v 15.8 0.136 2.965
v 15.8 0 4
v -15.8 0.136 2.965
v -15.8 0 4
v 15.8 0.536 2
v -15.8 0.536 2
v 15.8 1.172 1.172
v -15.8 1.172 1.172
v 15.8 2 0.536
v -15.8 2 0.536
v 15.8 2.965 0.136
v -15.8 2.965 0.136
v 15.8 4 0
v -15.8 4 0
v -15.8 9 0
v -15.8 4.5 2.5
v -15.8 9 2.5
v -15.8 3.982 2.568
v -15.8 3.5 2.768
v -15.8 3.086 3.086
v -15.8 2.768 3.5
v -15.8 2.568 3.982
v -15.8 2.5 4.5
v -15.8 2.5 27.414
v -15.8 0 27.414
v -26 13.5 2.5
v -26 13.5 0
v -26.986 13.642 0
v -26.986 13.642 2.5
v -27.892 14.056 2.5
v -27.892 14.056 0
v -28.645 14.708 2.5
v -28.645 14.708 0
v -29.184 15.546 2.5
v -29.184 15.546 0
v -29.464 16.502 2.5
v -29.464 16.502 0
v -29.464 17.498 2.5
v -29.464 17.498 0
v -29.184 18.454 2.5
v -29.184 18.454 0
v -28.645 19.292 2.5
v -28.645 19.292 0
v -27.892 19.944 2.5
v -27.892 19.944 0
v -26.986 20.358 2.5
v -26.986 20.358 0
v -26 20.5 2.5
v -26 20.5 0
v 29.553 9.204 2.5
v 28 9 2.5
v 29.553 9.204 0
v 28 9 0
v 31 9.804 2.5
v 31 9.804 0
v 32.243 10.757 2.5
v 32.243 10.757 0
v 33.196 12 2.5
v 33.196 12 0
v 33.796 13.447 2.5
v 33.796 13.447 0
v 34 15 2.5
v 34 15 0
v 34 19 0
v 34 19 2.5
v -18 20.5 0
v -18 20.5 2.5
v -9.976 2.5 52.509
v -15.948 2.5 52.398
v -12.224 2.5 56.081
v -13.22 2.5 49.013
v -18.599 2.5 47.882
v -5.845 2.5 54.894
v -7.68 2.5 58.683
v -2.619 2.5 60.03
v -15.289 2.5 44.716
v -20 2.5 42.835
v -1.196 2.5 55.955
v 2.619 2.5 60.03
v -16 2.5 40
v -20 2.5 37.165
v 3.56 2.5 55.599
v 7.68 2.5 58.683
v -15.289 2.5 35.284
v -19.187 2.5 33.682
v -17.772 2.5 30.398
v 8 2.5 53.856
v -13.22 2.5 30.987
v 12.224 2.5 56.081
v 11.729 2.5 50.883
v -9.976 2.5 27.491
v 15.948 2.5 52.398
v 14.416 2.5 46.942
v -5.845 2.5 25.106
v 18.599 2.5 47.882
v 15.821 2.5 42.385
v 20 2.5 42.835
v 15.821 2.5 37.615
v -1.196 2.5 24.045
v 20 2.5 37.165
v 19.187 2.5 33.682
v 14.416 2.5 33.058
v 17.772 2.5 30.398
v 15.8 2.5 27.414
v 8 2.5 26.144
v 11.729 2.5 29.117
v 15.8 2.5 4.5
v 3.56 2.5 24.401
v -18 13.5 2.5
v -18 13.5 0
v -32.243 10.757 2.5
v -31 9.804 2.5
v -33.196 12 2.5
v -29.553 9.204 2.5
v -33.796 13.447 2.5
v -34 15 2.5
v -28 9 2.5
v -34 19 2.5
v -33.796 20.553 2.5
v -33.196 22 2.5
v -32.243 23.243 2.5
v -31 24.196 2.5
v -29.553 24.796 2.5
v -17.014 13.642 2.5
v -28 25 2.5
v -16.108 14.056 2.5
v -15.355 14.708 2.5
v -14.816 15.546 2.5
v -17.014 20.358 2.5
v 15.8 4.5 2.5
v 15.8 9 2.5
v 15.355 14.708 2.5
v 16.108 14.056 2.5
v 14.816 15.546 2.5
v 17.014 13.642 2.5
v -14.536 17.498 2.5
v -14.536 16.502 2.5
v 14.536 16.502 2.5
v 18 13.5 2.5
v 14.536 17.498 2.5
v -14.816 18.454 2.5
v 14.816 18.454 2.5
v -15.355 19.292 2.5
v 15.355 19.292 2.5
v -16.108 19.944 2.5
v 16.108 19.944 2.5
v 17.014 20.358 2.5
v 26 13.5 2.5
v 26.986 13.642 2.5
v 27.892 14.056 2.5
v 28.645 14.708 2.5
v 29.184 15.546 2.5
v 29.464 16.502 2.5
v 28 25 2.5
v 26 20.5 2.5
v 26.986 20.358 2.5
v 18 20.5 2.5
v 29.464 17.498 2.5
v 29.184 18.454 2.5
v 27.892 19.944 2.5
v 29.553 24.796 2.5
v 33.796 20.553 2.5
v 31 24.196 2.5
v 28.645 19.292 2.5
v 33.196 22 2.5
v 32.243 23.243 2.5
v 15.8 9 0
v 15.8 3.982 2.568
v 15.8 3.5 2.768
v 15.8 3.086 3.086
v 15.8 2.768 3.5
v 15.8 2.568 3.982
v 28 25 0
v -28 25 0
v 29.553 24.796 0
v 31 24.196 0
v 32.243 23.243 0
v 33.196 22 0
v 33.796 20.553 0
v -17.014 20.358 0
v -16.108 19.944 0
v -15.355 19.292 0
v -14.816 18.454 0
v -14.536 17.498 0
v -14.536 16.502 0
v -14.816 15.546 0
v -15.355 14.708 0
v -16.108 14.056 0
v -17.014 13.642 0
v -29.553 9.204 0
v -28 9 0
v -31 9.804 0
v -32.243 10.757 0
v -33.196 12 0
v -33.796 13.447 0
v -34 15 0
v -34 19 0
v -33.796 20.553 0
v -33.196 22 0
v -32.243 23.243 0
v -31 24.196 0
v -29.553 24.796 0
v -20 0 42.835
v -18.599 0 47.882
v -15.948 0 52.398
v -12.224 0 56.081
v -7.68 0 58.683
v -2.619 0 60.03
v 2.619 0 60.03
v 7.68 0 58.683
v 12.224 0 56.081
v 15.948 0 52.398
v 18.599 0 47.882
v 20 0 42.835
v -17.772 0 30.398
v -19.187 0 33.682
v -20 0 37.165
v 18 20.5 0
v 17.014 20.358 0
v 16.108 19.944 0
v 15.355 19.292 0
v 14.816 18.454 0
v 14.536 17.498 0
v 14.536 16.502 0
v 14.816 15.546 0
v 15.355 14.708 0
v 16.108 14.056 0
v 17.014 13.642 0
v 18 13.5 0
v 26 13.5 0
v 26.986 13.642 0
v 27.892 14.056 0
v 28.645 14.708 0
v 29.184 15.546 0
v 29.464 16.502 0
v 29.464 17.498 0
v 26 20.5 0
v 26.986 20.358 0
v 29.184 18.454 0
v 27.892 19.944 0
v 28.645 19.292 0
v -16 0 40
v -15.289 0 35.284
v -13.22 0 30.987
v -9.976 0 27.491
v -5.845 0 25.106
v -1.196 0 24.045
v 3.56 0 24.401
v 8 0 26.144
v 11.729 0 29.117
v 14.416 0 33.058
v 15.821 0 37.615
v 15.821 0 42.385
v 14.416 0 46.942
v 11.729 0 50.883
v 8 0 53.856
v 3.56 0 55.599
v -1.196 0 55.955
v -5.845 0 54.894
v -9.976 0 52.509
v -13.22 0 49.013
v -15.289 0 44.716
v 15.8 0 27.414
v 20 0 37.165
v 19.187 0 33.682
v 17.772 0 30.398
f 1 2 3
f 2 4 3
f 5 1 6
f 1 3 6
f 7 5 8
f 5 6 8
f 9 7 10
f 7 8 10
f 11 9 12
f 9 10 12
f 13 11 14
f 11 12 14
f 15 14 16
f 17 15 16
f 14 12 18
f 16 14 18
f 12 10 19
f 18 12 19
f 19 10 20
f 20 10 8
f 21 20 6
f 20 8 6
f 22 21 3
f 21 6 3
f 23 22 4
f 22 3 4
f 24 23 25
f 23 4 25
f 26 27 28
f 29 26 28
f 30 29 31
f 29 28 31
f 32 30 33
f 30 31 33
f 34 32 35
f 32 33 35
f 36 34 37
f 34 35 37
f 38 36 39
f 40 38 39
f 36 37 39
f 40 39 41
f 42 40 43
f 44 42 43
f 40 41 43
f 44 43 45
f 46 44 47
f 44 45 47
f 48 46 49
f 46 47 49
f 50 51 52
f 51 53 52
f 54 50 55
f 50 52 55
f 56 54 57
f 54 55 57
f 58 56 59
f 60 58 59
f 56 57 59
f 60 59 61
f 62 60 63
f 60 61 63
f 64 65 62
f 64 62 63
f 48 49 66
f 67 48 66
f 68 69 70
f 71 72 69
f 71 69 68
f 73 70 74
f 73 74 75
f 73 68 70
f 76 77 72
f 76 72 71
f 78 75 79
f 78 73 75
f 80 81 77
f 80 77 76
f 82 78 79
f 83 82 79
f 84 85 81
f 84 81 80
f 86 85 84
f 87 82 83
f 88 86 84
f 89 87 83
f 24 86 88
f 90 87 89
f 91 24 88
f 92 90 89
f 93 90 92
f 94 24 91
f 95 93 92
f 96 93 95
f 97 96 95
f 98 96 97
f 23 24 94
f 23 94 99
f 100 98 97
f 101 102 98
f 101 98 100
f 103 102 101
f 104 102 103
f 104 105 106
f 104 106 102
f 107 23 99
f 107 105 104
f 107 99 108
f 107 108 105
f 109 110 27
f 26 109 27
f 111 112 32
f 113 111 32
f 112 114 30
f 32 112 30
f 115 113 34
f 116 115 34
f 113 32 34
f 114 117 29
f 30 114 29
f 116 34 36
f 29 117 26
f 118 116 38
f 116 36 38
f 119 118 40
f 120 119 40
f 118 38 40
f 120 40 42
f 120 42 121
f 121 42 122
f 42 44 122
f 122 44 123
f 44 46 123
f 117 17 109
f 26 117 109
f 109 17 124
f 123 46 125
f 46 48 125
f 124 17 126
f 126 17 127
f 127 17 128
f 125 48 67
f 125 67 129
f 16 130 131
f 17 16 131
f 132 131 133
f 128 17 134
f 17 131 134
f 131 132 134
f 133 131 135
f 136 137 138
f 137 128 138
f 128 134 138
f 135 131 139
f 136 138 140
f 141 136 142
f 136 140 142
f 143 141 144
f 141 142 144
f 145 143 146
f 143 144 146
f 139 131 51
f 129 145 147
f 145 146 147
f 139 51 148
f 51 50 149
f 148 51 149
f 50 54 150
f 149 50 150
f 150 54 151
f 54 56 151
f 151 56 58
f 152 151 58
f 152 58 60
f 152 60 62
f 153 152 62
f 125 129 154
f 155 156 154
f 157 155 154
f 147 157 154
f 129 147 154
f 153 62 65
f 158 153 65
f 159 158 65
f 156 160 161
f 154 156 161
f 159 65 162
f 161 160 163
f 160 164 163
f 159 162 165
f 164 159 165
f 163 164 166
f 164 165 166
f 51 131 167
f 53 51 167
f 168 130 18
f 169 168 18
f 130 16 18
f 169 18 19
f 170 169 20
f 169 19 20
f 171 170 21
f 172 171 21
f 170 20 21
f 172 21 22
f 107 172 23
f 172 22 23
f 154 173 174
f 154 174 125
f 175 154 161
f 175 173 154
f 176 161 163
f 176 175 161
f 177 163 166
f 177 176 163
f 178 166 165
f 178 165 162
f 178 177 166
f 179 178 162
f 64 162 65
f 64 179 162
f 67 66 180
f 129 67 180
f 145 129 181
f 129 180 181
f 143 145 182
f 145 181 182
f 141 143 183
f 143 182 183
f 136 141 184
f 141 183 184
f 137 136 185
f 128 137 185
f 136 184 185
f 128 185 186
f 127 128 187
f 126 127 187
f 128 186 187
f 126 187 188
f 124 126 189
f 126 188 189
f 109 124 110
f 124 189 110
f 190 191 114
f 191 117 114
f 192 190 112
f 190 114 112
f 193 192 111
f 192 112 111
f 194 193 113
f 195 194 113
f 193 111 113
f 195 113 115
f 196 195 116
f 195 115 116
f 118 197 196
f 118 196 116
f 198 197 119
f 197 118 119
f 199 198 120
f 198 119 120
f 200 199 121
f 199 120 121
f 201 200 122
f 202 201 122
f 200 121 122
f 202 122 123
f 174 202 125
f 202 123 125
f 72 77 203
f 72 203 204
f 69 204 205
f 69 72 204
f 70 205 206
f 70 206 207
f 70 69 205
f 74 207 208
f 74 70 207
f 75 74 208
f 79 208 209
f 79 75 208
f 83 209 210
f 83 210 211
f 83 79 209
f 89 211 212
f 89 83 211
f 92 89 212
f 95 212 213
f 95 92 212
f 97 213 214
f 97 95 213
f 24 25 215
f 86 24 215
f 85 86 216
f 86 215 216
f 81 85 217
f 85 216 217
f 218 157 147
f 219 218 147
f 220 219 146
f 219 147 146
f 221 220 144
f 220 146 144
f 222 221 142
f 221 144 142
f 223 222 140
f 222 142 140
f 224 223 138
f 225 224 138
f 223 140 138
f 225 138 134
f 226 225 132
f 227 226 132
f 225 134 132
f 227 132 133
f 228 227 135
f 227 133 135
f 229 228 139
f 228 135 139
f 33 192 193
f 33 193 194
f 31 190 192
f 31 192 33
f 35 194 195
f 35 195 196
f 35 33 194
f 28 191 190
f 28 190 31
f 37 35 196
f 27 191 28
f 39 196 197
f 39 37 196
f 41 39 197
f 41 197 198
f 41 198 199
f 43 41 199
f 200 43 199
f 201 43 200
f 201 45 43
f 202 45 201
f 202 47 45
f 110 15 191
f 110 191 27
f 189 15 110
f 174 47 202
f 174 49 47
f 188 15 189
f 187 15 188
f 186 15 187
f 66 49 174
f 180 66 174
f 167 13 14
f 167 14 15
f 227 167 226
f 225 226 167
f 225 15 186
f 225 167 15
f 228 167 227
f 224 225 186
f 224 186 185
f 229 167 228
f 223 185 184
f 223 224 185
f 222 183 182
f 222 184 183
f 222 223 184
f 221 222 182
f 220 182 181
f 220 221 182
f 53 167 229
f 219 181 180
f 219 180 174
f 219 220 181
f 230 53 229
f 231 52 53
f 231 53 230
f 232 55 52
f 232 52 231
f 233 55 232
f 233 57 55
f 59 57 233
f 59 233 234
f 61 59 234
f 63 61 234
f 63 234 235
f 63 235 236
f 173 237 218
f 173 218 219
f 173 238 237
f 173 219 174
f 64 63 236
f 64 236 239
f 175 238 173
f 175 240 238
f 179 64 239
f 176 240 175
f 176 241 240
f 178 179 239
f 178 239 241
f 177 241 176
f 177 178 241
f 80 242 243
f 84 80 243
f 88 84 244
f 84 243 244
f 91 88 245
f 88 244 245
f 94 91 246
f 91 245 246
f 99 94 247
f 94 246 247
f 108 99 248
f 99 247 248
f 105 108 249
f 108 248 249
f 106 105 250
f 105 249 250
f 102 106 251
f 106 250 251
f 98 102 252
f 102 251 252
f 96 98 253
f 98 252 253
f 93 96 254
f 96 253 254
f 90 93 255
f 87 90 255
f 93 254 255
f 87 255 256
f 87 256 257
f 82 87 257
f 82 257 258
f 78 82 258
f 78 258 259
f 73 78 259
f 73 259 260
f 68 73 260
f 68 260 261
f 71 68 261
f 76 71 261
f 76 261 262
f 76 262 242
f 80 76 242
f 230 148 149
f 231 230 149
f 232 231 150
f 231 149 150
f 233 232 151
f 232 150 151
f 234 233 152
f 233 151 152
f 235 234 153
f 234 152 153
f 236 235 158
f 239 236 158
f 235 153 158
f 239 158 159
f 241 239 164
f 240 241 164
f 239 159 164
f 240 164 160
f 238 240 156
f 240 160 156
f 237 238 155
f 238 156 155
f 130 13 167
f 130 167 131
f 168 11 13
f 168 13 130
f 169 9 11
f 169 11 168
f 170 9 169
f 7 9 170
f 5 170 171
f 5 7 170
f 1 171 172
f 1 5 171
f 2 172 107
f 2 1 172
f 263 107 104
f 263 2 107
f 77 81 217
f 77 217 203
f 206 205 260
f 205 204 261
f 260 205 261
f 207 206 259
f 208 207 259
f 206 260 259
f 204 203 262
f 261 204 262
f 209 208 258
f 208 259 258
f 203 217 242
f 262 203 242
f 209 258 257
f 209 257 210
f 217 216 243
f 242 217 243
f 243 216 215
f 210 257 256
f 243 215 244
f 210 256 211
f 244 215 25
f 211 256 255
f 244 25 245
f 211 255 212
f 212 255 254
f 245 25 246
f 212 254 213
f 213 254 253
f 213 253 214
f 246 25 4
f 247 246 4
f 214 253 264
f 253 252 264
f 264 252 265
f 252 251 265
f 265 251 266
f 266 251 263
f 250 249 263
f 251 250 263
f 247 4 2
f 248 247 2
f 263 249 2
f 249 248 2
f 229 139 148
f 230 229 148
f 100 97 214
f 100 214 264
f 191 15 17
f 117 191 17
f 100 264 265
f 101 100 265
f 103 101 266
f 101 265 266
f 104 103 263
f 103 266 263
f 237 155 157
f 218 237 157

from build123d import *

# Parameters (mm, degrees)
BOSS_EXTRUDE1_DEPTH       = 2.5
CUT_EXTRUDE1_DEPTH        = 3.5
CUT_EXTRUDE2_DEPTH        = 3.5
SKETCH4_W                 = 31.6
SKETCH4_H                 = 2.5
BOSS_EXTRUDE2_DEPTH       = 22.5
SKETCH5_W                 = 2.5
SKETCH5_H                 = 16
BOSS_EXTRUDE3_DEPTH       = 18.2
SKETCH6_W                 = 2.5
SKETCH6_H                 = 16
BOSS_EXTRUDE4_DEPTH       = 18.2
CUT_EXTRUDE3_DEPTH        = 3.5
CUT_EXTRUDE4_DEPTH        = 61.2
M27_CLEARANCE_HOLE1_D     = 32
M27_CLEARANCE_HOLE1_DEPTH = 2.5
FILLET1_R                 = 2
FILLET2_R                 = 4
FILLET3_R                 = 6


with BuildPart() as part:
    # Sketch1 → Boss-Extrude1 (new body)
    with BuildSketch(Plane(origin=(0, 2.5, 0), x_dir=(1, 0, 0), z_dir=(0, 1, 0))):
        with BuildLine():
            Line((20, -42.835489376), (20, 0))
            Line((20, 0), (-20, 0))
            Line((-20, 0), (-20, -42.835489376))
            ThreePointArc((-20, -42.835489376), (0, -60.2), (20, -42.835489376))
        make_face()
    extrude(amount=-BOSS_EXTRUDE1_DEPTH)

    # Sketch2 → Cut-Extrude1 (cut, through all)
    with BuildSketch(Plane.XZ):
        with BuildLine():
            Line((-15.8, 0), (-15.8, 27.414293822))
            ThreePointArc((-15.8, 27.414293822), (-18.551999405, 32.008547186), (-20, 37.164510624))
            Line((-20, 37.164510624), (-20, 0))
            Line((-20, 0), (-15.8, 0))
        make_face()
    extrude(amount=-CUT_EXTRUDE1_DEPTH, mode=Mode.SUBTRACT)

    # Sketch3 → Cut-Extrude2 (cut, through all)
    with BuildSketch(Plane.XZ):
        with BuildLine():
            Line((20, 0), (20, 37.164510624))
            ThreePointArc((20, 37.164510624), (18.551999405, 32.008547186), (15.8, 27.414293822))
            Line((15.8, 27.414293822), (15.8, 0))
            Line((15.8, 0), (20, 0))
        make_face()
    extrude(amount=-CUT_EXTRUDE2_DEPTH, mode=Mode.SUBTRACT)

    # Sketch4 → Boss-Extrude2 (add)
    with BuildSketch(Plane(origin=(0, 2.5, 0), x_dir=(-1, 0, 0), z_dir=(0, 1, 0))):
        with Locations((0, 1.25)):
            Rectangle(SKETCH4_W, SKETCH4_H)
    extrude(amount=BOSS_EXTRUDE2_DEPTH)

    # Sketch5 → Boss-Extrude3 (add)
    with BuildSketch(Plane(origin=(15.8, 0, 0), x_dir=(0, 0, -1), z_dir=(1, 0, 0))):
        with Locations((-1.25, 17)):
            Rectangle(SKETCH5_W, SKETCH5_H)
    extrude(amount=BOSS_EXTRUDE3_DEPTH)

    # Sketch6 → Boss-Extrude4 (add)
    with BuildSketch(Plane.ZY.offset(15.8)):
        with Locations((1.25, 17)):
            Rectangle(SKETCH6_W, SKETCH6_H)
    extrude(amount=BOSS_EXTRUDE4_DEPTH)

    # Sketch7 → Cut-Extrude3 (cut, through all)
    with BuildSketch(Plane.XY.offset(2.5)):
        with BuildLine():
            Line((26, 20.5), (18, 20.5))
            ThreePointArc((18, 20.5), (14.5, 17), (18, 13.5))
            Line((18, 13.5), (26, 13.5))
            ThreePointArc((26, 13.5), (29.5, 17), (26, 20.5))
        make_face()
    extrude(amount=-CUT_EXTRUDE3_DEPTH, mode=Mode.SUBTRACT)

    # Sketch8 → Cut-Extrude4 (cut, through all)
    with BuildSketch(Plane(origin=(0, 0, 0), x_dir=(-1, 0, 0), z_dir=(0, 0, -1))):
        with BuildLine():
            Line((26, 20.5), (18, 20.5))
            ThreePointArc((18, 20.5), (14.5, 17), (18, 13.5))
            Line((18, 13.5), (26, 13.5))
            ThreePointArc((26, 13.5), (29.5, 17), (26, 20.5))
        make_face()
    extrude(amount=-CUT_EXTRUDE4_DEPTH, mode=Mode.SUBTRACT)

    # M27 Clearance Hole1
    with Locations(Plane(origin=(0, 2.5, 0), x_dir=(1, 0, 0), z_dir=(0, 1, 0))):
        with Locations((0, -40)):
            Hole(M27_CLEARANCE_HOLE1_D / 2, depth=M27_CLEARANCE_HOLE1_DEPTH)

    # Fillet1
    fillet1_edges = [part.edges().sort_by_distance(p)[0] for p in [
        (0, 2.5, 2.5),
    ]]
    fillet(fillet1_edges, radius=FILLET1_R)

    # Fillet2
    fillet2_edges = [part.edges().sort_by_distance(p)[0] for p in [
        (0, 0, 0),
    ]]
    fillet(fillet2_edges, radius=FILLET2_R)

    # Fillet3
    fillet3_edges = [part.edges().sort_by_distance(p)[0] for p in [
        (34, 25, 1.25),
        (34, 9, 1.25),
        (-34, 9, 1.25),
        (-34, 25, 1.25),
    ]]
    fillet(fillet3_edges, radius=FILLET3_R)


solid = part.part
